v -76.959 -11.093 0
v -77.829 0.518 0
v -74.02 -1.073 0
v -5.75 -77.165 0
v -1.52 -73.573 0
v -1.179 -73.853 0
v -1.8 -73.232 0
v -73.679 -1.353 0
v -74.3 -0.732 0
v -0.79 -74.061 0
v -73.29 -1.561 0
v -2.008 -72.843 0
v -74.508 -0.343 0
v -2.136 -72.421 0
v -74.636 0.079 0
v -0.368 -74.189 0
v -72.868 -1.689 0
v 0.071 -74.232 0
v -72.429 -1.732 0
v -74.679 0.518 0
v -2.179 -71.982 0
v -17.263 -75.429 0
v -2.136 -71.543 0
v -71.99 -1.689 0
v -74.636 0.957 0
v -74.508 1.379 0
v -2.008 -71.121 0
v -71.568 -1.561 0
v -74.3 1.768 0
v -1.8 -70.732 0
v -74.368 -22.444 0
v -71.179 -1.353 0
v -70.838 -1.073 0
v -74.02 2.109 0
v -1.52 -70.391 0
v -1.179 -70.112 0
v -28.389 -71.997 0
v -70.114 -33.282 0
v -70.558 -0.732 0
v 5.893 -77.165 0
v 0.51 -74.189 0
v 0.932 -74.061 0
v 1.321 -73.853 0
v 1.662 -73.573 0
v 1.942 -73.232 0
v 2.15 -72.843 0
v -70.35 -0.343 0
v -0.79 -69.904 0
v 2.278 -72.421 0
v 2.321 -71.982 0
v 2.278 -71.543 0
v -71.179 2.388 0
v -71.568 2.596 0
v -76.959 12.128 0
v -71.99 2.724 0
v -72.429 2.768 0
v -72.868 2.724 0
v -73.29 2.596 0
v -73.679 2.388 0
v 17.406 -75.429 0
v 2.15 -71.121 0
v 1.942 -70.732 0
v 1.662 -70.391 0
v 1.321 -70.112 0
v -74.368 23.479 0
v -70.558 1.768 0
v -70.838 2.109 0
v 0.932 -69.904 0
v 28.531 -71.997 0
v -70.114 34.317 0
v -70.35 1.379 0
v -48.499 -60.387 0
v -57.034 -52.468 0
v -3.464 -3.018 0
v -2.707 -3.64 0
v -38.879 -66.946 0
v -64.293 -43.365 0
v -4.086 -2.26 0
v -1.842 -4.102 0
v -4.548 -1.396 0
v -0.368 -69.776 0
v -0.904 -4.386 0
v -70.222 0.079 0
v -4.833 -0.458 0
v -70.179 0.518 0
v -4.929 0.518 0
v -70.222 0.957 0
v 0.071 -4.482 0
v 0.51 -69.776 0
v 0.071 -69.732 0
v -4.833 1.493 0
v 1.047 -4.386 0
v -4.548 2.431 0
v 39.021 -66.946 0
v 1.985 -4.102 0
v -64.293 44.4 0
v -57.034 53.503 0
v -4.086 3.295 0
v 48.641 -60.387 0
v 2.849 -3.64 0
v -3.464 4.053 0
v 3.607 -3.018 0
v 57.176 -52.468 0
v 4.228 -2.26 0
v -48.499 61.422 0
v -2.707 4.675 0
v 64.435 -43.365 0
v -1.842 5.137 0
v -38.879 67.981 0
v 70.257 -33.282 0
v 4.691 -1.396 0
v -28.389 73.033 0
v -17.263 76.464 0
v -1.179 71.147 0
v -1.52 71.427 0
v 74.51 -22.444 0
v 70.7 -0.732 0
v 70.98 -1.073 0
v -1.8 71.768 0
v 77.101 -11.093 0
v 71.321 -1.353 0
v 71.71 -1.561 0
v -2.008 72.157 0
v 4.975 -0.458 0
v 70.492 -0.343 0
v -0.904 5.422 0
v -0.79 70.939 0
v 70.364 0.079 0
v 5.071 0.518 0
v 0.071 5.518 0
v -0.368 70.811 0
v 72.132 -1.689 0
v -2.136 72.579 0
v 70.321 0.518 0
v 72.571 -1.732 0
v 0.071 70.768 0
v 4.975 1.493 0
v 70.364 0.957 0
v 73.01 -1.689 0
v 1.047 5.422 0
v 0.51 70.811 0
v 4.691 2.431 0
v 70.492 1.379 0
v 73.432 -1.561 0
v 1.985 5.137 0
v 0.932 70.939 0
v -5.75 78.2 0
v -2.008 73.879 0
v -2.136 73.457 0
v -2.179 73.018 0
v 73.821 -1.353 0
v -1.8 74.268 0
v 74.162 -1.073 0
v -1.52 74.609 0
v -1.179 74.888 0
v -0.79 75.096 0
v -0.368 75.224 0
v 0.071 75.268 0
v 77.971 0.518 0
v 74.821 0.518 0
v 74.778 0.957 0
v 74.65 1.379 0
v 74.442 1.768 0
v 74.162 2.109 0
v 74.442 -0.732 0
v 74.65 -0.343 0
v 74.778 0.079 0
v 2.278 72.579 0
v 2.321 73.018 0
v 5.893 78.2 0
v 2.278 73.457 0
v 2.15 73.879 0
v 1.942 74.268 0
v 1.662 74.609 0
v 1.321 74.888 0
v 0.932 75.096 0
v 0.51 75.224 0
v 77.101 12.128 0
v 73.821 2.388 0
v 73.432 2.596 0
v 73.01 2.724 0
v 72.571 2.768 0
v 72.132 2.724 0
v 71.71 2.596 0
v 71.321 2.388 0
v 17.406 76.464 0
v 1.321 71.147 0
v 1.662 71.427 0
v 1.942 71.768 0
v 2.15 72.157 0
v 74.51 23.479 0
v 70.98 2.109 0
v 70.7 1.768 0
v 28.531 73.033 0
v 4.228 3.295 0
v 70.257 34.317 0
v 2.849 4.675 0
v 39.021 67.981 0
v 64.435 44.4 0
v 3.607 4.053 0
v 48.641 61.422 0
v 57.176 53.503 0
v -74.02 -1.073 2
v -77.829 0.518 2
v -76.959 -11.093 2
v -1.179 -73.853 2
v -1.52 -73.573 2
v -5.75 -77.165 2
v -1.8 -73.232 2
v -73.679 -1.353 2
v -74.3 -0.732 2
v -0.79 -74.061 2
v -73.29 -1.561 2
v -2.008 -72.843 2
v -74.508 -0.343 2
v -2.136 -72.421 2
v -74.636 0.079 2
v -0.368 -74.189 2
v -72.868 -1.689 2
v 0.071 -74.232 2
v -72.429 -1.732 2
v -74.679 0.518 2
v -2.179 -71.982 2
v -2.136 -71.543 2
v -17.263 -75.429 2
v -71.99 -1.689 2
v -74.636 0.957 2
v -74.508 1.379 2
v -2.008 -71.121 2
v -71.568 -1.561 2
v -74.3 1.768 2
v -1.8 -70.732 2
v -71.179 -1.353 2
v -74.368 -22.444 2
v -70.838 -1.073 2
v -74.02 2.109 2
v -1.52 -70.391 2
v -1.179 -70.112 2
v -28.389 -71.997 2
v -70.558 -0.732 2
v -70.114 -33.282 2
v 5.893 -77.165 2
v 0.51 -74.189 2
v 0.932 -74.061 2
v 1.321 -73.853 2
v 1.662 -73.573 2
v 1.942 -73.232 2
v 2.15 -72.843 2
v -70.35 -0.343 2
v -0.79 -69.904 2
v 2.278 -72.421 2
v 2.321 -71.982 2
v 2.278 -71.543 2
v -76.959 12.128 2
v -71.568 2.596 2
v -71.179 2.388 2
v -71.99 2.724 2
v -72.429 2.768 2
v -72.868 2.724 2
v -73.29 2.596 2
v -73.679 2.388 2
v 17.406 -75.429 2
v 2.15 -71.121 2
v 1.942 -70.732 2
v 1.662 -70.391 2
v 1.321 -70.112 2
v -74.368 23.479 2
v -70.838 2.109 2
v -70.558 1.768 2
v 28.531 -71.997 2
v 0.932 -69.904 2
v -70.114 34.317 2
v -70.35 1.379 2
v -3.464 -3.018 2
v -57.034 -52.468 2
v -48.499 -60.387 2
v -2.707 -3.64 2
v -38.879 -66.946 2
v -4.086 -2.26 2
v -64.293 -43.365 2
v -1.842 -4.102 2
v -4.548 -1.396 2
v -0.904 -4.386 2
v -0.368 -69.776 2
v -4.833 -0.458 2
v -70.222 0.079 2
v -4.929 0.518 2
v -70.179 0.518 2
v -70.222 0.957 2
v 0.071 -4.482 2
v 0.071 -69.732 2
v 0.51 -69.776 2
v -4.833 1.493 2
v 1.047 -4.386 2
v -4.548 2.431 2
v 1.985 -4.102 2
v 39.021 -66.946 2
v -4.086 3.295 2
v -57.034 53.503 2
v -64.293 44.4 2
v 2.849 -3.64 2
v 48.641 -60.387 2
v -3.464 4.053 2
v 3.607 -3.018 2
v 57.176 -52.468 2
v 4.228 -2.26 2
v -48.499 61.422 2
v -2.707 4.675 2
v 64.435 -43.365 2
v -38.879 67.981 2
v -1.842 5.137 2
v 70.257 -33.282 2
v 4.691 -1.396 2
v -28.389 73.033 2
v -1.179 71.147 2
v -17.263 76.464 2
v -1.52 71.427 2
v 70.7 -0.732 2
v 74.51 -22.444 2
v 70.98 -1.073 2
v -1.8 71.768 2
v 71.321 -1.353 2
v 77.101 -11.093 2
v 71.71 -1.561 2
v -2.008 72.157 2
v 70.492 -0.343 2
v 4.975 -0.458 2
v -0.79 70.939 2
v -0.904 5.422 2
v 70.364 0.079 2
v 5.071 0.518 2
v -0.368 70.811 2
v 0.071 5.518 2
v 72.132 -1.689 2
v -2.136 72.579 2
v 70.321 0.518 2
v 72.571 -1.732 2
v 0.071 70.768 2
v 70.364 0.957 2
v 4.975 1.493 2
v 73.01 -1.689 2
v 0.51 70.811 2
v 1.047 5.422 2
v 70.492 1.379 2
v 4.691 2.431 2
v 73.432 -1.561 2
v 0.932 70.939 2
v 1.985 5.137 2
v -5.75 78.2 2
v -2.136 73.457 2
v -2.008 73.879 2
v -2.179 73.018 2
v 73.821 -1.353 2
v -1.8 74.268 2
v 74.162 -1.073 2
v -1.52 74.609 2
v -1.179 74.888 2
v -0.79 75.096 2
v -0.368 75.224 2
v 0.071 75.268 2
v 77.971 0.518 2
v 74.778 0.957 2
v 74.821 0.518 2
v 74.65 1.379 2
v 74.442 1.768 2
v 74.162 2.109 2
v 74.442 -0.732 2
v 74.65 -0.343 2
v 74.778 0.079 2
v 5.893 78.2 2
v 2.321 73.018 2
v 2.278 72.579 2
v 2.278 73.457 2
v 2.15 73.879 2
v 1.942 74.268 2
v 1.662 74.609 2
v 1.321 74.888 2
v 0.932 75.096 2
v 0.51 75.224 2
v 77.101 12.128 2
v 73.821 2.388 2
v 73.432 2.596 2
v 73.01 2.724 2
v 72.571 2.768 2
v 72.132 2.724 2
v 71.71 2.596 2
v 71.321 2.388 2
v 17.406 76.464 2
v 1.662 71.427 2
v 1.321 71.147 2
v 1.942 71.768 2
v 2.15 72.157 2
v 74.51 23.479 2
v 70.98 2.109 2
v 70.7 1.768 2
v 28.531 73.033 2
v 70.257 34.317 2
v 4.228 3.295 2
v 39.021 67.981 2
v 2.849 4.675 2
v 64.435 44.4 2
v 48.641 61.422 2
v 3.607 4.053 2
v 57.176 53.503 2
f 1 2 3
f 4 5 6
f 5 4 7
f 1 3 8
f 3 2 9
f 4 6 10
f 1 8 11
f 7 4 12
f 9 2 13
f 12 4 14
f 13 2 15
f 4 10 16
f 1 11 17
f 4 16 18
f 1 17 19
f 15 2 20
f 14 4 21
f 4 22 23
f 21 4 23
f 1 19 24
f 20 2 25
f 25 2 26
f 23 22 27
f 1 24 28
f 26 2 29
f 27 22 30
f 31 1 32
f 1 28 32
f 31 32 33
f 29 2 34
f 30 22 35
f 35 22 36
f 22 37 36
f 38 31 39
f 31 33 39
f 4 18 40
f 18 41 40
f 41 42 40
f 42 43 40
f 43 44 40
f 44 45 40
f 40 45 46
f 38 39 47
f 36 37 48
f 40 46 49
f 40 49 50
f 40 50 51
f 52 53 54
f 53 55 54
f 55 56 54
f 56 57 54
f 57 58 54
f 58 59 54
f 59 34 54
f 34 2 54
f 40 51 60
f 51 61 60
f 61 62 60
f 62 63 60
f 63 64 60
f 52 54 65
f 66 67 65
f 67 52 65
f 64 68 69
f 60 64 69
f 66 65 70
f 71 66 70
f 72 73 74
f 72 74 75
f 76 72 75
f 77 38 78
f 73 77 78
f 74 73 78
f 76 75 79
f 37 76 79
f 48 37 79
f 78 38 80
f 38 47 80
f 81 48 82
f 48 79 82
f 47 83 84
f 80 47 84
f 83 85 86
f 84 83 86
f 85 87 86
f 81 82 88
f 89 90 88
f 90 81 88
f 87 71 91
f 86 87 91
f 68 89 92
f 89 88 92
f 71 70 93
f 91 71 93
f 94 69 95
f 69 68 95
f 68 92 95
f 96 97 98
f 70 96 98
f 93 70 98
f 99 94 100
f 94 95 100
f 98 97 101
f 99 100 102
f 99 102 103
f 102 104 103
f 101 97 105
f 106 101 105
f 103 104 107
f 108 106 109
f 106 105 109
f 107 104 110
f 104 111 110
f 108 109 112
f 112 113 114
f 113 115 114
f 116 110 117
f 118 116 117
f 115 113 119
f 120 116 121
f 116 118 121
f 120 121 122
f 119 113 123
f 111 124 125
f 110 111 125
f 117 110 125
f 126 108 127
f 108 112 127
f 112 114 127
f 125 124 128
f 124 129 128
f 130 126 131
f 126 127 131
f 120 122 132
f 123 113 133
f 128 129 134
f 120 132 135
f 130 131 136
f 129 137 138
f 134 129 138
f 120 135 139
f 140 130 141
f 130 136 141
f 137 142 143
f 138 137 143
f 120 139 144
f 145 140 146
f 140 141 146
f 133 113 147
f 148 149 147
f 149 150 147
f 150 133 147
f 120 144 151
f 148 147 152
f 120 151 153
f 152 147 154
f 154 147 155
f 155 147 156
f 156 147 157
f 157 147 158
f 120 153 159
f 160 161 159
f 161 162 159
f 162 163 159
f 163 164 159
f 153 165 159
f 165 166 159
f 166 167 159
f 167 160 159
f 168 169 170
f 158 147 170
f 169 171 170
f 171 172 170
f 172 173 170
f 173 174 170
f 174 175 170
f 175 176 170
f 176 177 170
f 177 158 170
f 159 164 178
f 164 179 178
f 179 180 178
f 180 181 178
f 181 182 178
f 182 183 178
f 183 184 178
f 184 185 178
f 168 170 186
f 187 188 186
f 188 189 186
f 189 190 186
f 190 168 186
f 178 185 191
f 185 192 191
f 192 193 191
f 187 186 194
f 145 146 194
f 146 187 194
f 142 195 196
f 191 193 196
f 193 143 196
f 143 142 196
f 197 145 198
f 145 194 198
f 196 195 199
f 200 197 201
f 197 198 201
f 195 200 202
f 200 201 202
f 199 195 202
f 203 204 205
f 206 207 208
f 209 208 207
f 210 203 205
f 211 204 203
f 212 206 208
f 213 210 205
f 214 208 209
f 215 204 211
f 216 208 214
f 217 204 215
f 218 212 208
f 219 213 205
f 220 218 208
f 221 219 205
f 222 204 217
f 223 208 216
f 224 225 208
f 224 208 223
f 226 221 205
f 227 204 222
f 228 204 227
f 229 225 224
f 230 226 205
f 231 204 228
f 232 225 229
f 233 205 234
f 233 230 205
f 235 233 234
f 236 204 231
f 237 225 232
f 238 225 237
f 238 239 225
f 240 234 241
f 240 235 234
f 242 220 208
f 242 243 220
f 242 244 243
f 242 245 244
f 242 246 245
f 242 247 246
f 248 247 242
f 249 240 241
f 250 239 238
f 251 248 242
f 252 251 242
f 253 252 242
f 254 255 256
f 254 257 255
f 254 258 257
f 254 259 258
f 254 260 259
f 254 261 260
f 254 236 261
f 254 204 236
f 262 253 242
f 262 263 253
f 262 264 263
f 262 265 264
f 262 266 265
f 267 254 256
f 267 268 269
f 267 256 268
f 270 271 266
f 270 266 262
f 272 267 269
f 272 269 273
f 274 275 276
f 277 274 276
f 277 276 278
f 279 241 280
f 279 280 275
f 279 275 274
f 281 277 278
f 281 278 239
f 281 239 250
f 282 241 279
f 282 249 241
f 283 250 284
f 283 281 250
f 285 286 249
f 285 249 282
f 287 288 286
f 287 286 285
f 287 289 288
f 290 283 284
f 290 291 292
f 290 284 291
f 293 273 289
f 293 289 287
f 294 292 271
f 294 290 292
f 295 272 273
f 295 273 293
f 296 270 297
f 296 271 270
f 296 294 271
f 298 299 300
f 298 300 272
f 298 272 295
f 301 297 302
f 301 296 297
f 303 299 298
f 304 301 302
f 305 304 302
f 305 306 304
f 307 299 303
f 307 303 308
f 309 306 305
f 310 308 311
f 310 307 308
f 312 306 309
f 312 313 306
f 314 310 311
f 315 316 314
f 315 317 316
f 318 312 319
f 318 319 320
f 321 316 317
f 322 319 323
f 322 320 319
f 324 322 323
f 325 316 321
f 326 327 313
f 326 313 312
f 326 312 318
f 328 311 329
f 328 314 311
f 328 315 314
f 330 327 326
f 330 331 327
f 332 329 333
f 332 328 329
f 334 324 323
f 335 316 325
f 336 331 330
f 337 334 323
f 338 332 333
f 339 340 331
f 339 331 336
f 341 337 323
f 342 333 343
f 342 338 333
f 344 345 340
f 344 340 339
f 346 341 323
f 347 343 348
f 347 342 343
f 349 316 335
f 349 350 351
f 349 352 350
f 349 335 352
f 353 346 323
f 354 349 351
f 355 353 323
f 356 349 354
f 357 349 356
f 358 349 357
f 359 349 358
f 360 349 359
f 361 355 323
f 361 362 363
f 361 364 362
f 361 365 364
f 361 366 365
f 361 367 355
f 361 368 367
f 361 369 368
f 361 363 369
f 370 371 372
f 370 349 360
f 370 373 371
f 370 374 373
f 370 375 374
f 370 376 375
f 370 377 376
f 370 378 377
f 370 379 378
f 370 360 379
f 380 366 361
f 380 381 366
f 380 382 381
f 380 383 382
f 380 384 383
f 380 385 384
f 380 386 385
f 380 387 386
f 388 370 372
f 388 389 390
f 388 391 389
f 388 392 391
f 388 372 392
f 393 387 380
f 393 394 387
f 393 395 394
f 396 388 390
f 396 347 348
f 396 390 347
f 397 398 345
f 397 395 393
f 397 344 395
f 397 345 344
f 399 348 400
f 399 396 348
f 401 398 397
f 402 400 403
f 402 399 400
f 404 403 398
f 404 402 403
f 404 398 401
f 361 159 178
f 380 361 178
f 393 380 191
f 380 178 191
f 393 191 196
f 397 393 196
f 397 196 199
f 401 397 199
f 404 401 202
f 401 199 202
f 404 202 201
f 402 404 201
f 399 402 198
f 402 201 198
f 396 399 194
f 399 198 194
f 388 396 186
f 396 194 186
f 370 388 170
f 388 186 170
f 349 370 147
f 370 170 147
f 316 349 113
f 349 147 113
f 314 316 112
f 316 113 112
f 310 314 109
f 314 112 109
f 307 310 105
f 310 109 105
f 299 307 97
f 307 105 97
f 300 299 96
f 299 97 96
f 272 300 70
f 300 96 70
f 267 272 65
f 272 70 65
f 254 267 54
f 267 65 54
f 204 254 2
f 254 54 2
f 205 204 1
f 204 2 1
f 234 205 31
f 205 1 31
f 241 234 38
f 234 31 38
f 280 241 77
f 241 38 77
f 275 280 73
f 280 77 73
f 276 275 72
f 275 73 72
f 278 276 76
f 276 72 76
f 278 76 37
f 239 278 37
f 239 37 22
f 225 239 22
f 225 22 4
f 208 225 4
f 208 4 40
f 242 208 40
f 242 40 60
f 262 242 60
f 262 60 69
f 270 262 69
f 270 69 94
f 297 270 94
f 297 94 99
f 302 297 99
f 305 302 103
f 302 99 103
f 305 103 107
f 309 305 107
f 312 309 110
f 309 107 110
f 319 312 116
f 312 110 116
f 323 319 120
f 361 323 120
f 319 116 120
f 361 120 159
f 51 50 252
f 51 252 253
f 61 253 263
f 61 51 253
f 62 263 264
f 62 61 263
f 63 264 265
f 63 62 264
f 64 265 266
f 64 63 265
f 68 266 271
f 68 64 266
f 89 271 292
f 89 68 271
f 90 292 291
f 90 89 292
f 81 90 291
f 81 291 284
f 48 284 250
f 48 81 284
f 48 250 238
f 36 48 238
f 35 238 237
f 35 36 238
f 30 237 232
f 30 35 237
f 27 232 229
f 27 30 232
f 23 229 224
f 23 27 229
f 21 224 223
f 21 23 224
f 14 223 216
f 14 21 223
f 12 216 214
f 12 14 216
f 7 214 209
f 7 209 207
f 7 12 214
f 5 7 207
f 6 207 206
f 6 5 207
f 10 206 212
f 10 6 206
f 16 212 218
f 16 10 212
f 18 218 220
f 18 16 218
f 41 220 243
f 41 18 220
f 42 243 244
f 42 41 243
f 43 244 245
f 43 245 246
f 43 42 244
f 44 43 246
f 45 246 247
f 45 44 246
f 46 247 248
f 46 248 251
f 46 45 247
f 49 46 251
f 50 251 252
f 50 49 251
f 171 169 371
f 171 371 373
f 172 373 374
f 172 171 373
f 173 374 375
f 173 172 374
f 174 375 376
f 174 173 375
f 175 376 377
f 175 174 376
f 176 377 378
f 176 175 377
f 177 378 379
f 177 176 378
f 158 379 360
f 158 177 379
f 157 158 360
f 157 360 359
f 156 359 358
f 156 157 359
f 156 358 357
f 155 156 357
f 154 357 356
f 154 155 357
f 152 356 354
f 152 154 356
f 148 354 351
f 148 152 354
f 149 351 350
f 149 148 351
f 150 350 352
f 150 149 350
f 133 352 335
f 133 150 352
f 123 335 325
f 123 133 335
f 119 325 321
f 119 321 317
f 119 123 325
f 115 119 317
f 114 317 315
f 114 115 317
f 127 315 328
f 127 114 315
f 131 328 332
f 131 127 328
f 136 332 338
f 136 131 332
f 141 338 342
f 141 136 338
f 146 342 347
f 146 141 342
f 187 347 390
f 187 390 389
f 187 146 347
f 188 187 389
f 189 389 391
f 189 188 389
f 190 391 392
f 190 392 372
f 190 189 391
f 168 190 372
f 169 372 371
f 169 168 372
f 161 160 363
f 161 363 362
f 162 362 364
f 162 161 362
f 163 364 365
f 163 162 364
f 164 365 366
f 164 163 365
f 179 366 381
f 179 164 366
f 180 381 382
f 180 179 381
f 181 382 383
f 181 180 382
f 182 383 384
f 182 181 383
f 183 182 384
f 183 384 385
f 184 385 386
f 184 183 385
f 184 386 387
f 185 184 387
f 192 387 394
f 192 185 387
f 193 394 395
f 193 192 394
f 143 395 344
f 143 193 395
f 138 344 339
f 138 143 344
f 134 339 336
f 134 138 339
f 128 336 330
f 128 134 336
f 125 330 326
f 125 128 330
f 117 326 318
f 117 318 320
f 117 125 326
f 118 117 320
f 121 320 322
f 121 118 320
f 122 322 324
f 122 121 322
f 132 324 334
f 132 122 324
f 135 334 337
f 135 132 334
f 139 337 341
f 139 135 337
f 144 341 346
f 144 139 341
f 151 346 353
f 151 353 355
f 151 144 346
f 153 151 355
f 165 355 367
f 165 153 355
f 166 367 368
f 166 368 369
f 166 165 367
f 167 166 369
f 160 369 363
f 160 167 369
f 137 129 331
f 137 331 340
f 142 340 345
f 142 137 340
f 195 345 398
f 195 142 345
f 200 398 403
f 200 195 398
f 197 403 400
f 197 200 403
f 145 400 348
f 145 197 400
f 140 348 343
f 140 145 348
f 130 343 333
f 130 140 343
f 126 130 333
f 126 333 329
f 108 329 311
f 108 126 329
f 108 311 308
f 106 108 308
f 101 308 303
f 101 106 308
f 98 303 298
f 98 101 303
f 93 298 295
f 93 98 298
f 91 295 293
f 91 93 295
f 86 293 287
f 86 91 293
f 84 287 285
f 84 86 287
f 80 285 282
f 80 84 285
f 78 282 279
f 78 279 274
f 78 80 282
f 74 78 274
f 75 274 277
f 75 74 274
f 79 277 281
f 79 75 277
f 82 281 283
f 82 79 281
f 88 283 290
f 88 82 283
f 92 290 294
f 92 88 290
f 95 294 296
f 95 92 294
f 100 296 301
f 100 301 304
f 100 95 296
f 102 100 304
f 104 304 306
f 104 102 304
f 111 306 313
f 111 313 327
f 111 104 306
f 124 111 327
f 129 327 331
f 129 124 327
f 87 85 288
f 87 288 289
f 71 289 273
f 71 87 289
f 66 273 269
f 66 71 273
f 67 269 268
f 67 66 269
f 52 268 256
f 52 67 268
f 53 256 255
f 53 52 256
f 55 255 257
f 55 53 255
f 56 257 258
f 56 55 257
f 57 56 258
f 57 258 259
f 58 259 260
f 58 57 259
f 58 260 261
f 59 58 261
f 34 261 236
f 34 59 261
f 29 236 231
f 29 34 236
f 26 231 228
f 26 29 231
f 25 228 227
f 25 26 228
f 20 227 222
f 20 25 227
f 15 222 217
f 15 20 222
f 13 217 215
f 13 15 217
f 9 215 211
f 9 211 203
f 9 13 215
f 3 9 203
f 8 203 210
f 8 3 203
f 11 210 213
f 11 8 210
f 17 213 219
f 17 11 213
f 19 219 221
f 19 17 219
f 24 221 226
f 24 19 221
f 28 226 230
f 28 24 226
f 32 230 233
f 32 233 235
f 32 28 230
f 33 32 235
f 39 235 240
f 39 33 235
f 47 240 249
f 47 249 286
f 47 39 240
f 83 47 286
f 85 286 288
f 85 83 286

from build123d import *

# Parameters (mm, degrees)
ESQUISSE1_R        = 77.9
ESQUISSE1_R_2      = 2.25
ESQUISSE1_R_3      = 5
BOSS_EXTRU_1_DEPTH = 2


with BuildPart() as part:
    # Esquisse1 → Boss.-Extru.1 (new body)
    with BuildSketch(Plane.XY):
        with Locations((0.071120791, 0.517607885)):
            Circle(ESQUISSE1_R)
        with Locations((0.071120791, 73.017607885)):
            Circle(ESQUISSE1_R_2, mode=Mode.SUBTRACT)
        with Locations((72.571120791, 0.517607885)):
            Circle(ESQUISSE1_R_2, mode=Mode.SUBTRACT)
        with Locations((0.071120791, -71.982392115)):
            Circle(ESQUISSE1_R_2, mode=Mode.SUBTRACT)
        with Locations((-72.428879209, 0.517607885)):
            Circle(ESQUISSE1_R_2, mode=Mode.SUBTRACT)
        with Locations((0.071120791, 0.517607885)):
            Circle(ESQUISSE1_R_3, mode=Mode.SUBTRACT)
    extrude(amount=BOSS_EXTRU_1_DEPTH)


solid = part.part
